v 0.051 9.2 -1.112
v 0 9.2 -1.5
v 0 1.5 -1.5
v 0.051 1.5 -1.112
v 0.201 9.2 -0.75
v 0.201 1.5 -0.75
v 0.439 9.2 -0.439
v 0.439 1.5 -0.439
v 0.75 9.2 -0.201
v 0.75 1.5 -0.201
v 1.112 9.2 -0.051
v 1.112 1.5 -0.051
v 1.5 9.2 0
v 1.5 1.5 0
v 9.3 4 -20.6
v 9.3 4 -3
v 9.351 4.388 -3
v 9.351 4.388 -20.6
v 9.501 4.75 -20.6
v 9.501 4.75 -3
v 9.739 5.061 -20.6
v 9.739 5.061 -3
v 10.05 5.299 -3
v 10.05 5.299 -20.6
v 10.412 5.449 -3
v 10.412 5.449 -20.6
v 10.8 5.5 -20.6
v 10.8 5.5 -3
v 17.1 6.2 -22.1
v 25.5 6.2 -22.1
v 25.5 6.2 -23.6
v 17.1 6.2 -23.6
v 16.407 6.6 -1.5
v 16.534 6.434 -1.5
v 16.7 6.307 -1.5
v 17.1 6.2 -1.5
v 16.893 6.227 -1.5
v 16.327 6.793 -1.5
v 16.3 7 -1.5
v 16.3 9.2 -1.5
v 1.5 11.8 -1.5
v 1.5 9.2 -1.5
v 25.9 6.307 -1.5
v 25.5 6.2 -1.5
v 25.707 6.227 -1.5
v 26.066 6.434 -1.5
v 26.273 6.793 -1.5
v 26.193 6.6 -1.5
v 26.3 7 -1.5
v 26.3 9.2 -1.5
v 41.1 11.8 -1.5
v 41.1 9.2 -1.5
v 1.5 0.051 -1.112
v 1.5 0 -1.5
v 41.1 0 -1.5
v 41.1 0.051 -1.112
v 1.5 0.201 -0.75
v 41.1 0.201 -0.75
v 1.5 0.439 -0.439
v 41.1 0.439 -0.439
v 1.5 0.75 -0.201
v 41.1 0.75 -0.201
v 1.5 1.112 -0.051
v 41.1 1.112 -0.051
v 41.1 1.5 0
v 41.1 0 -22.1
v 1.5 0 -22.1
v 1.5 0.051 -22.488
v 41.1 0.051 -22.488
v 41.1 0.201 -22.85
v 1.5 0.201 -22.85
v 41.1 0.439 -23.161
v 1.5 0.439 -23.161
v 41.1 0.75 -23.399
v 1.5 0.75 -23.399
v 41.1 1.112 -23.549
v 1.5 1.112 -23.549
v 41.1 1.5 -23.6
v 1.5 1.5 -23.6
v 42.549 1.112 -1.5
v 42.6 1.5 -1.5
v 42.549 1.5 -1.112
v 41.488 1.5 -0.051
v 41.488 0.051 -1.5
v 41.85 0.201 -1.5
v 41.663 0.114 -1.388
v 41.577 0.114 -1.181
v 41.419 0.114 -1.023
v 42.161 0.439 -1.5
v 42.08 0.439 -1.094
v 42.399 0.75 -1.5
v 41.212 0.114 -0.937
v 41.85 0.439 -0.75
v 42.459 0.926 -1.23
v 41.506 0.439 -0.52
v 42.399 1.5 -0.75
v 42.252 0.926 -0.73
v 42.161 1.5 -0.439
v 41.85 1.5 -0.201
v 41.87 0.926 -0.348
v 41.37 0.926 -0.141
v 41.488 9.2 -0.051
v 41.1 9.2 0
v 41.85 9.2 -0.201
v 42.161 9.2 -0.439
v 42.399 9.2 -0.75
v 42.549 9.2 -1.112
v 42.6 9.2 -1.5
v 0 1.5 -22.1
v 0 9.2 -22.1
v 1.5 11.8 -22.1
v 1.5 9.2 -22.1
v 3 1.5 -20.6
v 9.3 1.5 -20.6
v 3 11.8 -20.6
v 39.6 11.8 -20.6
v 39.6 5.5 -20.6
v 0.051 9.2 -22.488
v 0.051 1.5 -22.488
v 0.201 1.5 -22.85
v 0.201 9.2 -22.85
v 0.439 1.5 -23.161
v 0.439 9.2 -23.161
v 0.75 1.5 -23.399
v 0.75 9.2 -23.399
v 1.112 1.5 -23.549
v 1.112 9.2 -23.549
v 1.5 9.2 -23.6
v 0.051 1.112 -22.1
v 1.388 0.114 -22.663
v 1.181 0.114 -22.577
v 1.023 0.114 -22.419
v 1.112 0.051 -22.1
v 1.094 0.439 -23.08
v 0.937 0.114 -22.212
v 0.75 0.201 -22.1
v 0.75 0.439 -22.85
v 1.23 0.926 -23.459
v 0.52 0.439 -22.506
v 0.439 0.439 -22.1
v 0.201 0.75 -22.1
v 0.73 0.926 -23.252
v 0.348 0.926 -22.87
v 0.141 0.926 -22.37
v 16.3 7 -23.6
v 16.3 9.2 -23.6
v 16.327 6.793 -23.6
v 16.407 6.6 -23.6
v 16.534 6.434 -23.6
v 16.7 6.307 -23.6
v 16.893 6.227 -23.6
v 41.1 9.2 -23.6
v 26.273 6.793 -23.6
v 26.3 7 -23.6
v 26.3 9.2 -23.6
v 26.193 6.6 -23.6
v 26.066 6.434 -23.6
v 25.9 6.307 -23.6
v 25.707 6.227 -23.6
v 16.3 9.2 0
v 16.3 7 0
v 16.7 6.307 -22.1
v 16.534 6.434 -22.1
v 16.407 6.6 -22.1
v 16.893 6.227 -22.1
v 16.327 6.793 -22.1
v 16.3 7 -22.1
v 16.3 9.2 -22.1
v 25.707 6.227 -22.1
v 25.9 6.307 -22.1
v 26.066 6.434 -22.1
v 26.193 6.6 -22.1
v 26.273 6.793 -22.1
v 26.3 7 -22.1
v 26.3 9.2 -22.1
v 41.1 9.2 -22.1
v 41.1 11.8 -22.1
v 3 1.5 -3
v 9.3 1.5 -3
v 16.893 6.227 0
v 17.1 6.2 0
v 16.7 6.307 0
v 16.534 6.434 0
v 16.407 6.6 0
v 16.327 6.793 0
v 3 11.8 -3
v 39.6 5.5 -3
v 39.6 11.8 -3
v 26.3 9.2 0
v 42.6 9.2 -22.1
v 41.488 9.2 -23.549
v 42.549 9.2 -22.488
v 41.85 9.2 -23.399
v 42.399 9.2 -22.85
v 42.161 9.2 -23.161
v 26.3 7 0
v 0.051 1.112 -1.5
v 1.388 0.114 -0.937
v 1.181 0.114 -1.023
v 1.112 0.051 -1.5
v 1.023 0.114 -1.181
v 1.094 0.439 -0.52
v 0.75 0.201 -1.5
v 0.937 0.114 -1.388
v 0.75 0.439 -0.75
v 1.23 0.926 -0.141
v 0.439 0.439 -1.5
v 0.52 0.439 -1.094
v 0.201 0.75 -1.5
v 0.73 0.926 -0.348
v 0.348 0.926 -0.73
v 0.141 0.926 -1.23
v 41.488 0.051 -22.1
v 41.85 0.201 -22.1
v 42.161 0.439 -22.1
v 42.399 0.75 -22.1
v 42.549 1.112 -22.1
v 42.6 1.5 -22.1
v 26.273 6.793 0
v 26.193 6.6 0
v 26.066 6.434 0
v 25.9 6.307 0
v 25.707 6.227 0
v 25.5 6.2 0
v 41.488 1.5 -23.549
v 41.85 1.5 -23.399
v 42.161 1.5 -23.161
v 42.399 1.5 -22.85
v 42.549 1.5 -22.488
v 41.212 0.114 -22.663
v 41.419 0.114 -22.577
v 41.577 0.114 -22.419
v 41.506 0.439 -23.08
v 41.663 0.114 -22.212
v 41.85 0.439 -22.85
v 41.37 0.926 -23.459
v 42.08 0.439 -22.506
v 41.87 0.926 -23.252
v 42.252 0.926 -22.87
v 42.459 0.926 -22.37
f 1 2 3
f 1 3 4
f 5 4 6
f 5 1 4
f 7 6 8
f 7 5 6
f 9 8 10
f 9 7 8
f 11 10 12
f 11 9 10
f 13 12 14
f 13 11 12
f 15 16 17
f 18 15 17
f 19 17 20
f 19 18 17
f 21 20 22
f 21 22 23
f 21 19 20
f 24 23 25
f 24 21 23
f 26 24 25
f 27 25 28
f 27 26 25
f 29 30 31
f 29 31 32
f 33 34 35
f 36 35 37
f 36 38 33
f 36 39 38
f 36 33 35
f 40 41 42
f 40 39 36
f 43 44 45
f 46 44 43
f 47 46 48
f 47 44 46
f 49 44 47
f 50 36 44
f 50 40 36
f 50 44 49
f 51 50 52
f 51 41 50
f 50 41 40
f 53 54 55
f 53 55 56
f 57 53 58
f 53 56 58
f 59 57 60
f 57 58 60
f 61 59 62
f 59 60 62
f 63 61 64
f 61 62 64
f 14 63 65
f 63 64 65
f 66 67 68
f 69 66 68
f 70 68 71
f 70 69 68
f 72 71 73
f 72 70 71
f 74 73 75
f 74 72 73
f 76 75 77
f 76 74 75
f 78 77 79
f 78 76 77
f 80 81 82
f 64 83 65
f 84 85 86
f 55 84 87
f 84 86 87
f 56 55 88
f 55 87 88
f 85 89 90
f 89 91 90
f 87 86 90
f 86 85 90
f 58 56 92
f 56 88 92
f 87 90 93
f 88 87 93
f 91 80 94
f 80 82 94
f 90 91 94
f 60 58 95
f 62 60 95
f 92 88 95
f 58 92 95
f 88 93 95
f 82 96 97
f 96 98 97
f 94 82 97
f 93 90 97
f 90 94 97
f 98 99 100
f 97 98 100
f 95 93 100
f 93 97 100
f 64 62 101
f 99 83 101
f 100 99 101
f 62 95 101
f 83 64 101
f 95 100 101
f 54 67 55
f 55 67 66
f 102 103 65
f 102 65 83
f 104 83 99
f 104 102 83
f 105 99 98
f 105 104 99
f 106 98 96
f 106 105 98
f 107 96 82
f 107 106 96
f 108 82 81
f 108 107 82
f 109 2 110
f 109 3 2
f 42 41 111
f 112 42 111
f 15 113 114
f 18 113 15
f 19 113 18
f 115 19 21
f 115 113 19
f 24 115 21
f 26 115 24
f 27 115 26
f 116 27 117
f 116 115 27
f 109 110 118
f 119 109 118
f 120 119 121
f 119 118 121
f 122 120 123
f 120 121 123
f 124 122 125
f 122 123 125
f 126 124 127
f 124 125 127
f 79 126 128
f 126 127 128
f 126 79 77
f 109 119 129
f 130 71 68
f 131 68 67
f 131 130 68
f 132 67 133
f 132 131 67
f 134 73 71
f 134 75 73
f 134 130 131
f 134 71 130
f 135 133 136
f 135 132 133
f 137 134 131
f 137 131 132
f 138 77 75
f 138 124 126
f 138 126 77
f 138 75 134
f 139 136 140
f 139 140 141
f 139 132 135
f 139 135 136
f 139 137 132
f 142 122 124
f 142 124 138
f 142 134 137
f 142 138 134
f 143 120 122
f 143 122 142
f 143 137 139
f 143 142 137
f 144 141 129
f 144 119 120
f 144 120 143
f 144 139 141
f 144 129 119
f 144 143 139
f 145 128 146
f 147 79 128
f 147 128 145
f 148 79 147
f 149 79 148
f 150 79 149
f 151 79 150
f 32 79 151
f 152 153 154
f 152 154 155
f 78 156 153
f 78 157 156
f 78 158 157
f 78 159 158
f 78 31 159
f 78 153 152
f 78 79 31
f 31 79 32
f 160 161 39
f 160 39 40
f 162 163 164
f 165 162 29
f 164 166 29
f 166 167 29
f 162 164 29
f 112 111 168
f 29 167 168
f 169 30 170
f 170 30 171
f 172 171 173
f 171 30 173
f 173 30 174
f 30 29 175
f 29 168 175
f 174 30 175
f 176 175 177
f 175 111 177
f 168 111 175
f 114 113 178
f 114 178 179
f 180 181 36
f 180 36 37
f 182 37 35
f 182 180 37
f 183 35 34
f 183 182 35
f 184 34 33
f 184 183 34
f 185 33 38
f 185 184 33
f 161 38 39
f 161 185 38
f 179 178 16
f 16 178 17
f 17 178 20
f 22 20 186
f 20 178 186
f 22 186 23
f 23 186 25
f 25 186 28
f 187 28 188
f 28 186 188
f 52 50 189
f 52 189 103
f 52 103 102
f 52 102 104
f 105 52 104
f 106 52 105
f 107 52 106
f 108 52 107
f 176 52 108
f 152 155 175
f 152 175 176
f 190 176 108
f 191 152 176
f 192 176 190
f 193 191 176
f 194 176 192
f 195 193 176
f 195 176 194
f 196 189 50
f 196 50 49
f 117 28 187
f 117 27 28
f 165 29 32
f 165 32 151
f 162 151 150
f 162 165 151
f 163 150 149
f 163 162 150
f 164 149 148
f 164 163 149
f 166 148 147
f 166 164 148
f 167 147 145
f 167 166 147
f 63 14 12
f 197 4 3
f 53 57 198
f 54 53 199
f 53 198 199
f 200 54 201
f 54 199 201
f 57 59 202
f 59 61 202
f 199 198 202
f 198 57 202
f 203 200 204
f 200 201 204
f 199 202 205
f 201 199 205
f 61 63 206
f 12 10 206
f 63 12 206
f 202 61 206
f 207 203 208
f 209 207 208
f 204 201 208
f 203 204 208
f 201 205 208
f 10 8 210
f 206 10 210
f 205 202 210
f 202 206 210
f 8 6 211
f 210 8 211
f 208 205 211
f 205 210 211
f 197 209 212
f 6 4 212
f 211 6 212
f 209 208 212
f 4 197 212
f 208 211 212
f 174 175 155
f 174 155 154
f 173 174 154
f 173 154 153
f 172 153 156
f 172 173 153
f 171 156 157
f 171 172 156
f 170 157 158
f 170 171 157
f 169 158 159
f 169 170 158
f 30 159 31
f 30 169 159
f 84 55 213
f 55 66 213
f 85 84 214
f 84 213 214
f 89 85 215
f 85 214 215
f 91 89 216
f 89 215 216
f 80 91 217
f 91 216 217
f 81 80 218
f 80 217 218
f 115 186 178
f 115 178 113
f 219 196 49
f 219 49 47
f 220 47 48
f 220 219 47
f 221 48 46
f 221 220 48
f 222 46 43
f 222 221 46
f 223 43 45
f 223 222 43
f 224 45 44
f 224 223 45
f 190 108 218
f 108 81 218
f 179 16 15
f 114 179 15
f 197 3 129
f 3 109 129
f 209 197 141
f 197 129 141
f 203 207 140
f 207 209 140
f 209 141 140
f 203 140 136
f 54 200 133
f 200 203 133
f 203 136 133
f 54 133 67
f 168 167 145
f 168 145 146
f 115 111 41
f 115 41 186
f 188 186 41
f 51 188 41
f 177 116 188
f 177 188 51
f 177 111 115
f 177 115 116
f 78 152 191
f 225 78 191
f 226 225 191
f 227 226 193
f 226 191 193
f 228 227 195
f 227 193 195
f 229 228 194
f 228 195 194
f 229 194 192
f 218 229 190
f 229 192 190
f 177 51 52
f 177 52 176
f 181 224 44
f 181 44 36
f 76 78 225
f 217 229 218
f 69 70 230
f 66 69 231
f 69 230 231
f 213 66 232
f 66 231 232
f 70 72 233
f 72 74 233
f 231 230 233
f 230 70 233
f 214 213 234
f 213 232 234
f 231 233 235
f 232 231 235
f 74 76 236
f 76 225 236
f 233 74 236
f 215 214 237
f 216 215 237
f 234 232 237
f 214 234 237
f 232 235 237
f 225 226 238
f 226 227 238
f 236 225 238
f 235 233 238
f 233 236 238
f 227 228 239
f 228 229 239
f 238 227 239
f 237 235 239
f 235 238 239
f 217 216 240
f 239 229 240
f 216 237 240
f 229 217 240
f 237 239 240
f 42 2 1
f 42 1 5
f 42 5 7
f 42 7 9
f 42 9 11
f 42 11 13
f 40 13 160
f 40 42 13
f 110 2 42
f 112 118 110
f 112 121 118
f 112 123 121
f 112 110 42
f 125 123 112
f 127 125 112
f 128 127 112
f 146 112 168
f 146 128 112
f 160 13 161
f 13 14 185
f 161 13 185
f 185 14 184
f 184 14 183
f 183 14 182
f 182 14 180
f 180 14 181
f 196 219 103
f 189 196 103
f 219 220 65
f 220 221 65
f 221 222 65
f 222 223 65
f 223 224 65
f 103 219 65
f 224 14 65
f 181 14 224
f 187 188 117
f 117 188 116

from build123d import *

# Parameters (mm, degrees)
SKETCH2_W           = 42.6
SKETCH2_H           = 23.6
BOSS_EXTRUDE1_DEPTH = 11.8
SKETCH4_W           = 30.3
SKETCH4_H           = 17.6
CUT_EXTRUDE2_DEPTH  = 6.3
SKETCH5_W           = 6.3
SKETCH5_H           = 17.6
CUT_EXTRUDE3_DEPTH  = 10.3
SKETCH6_W           = 42.6
SKETCH6_H           = 23.6
SKETCH6_W_2         = 39.6
SKETCH6_H_2         = 20.6
CUT_EXTRUDE4_DEPTH  = 2.6
FILLET1_R           = 1.5
FILLET2_R           = 1.5
CUT_EXTRUDE5_DEPTH  = 1.5
CUT_EXTRUDE6_START  = -1.5
CUT_EXTRUDE6_DEPTH  = 1.5


with BuildPart() as part:
    # Sketch2 → Boss-Extrude1 (new body)
    with BuildSketch(Plane(origin=(0, 0, 0), x_dir=(1, 0, 0), z_dir=(0, 1, 0))):
        with Locations((21.3, 11.8)):
            Rectangle(SKETCH2_W, SKETCH2_H)
    extrude(amount=BOSS_EXTRUDE1_DEPTH)

    # Sketch4 → Cut-Extrude2 (cut)
    with BuildSketch(Plane(origin=(0, 11.8, 0), x_dir=(1, 0, 0), z_dir=(0, 1, 0))):
        with Locations((24.45, 11.8)):
            Rectangle(SKETCH4_W, SKETCH4_H)
    extrude(amount=-CUT_EXTRUDE2_DEPTH, mode=Mode.SUBTRACT)

    # Sketch5 → Cut-Extrude3 (cut)
    with BuildSketch(Plane(origin=(0, 11.8, 0), x_dir=(1, 0, 0), z_dir=(0, 1, 0))):
        with Locations((6.15, 11.8)):
            Rectangle(SKETCH5_W, SKETCH5_H)
    extrude(amount=-CUT_EXTRUDE3_DEPTH, mode=Mode.SUBTRACT)

    # Sketch6 → Cut-Extrude4 (cut)
    with BuildSketch(Plane(origin=(0, 11.8, 0), x_dir=(1, 0, 0), z_dir=(0, 1, 0))):
        with Locations((21.3, 11.8)):
            Rectangle(SKETCH6_W, SKETCH6_H)
        with Locations((21.3, 11.8)):
            Rectangle(SKETCH6_W_2, SKETCH6_H_2, mode=Mode.SUBTRACT)
    extrude(amount=-CUT_EXTRUDE4_DEPTH, mode=Mode.SUBTRACT)

    # Fillet1
    fillet1_edges = [part.edges().sort_by_distance(p)[0] for p in [
        (0, 4.6, -23.6),
        (42.6, 4.6, -23.6),
        (42.6, 4.6, 0),
        (0, 4.6, 0),
        (21.3, 0, -23.6),
        (42.6, 0, -11.8),
        (21.3, 0, 0),
        (0, 0, -11.8),
    ]]
    fillet(fillet1_edges, radius=FILLET1_R)

    # Fillet2
    fillet2_edges = [part.edges().sort_by_distance(p)[0] for p in [
        (9.3, 5.5, -11.8),
    ]]
    fillet(fillet2_edges, radius=FILLET2_R)

    # Sketch8 → Cut-Extrude5 (cut)
    with BuildSketch(Plane.XY):
        with BuildLine():
            Line((16.3, 9.2), (26.3, 9.2))
            Line((26.3, 9.2), (26.3, 7))
            ThreePointArc((26.3, 7), (26.065685425, 6.434314575), (25.5, 6.2))
            Line((25.5, 6.2), (17.1, 6.2))
            ThreePointArc((17.1, 6.2), (16.534314575, 6.434314575), (16.3, 7))
            Line((16.3, 7), (16.3, 9.2))
        make_face()
    extrude(amount=-CUT_EXTRUDE5_DEPTH, mode=Mode.SUBTRACT)

    # Sketch9 → Cut-Extrude6 (cut)
    with BuildSketch(Plane(origin=(0, 0, -23.6), x_dir=(-1, 0, 0), z_dir=(0, 0, -1)).offset(CUT_EXTRUDE6_START)):
        with BuildLine():
            Line((-16.3, 9.2), (-26.3, 9.2))
            Line((-26.3, 9.2), (-26.3, 7))
            ThreePointArc((-26.3, 7), (-26.065685425, 6.434314575), (-25.5, 6.2))
            Line((-25.5, 6.2), (-17.1, 6.2))
            ThreePointArc((-17.1, 6.2), (-16.534314575, 6.434314575), (-16.3, 7))
            Line((-16.3, 7), (-16.3, 9.2))
        make_face()
    extrude(amount=CUT_EXTRUDE6_DEPTH, mode=Mode.SUBTRACT)


solid = part.part
